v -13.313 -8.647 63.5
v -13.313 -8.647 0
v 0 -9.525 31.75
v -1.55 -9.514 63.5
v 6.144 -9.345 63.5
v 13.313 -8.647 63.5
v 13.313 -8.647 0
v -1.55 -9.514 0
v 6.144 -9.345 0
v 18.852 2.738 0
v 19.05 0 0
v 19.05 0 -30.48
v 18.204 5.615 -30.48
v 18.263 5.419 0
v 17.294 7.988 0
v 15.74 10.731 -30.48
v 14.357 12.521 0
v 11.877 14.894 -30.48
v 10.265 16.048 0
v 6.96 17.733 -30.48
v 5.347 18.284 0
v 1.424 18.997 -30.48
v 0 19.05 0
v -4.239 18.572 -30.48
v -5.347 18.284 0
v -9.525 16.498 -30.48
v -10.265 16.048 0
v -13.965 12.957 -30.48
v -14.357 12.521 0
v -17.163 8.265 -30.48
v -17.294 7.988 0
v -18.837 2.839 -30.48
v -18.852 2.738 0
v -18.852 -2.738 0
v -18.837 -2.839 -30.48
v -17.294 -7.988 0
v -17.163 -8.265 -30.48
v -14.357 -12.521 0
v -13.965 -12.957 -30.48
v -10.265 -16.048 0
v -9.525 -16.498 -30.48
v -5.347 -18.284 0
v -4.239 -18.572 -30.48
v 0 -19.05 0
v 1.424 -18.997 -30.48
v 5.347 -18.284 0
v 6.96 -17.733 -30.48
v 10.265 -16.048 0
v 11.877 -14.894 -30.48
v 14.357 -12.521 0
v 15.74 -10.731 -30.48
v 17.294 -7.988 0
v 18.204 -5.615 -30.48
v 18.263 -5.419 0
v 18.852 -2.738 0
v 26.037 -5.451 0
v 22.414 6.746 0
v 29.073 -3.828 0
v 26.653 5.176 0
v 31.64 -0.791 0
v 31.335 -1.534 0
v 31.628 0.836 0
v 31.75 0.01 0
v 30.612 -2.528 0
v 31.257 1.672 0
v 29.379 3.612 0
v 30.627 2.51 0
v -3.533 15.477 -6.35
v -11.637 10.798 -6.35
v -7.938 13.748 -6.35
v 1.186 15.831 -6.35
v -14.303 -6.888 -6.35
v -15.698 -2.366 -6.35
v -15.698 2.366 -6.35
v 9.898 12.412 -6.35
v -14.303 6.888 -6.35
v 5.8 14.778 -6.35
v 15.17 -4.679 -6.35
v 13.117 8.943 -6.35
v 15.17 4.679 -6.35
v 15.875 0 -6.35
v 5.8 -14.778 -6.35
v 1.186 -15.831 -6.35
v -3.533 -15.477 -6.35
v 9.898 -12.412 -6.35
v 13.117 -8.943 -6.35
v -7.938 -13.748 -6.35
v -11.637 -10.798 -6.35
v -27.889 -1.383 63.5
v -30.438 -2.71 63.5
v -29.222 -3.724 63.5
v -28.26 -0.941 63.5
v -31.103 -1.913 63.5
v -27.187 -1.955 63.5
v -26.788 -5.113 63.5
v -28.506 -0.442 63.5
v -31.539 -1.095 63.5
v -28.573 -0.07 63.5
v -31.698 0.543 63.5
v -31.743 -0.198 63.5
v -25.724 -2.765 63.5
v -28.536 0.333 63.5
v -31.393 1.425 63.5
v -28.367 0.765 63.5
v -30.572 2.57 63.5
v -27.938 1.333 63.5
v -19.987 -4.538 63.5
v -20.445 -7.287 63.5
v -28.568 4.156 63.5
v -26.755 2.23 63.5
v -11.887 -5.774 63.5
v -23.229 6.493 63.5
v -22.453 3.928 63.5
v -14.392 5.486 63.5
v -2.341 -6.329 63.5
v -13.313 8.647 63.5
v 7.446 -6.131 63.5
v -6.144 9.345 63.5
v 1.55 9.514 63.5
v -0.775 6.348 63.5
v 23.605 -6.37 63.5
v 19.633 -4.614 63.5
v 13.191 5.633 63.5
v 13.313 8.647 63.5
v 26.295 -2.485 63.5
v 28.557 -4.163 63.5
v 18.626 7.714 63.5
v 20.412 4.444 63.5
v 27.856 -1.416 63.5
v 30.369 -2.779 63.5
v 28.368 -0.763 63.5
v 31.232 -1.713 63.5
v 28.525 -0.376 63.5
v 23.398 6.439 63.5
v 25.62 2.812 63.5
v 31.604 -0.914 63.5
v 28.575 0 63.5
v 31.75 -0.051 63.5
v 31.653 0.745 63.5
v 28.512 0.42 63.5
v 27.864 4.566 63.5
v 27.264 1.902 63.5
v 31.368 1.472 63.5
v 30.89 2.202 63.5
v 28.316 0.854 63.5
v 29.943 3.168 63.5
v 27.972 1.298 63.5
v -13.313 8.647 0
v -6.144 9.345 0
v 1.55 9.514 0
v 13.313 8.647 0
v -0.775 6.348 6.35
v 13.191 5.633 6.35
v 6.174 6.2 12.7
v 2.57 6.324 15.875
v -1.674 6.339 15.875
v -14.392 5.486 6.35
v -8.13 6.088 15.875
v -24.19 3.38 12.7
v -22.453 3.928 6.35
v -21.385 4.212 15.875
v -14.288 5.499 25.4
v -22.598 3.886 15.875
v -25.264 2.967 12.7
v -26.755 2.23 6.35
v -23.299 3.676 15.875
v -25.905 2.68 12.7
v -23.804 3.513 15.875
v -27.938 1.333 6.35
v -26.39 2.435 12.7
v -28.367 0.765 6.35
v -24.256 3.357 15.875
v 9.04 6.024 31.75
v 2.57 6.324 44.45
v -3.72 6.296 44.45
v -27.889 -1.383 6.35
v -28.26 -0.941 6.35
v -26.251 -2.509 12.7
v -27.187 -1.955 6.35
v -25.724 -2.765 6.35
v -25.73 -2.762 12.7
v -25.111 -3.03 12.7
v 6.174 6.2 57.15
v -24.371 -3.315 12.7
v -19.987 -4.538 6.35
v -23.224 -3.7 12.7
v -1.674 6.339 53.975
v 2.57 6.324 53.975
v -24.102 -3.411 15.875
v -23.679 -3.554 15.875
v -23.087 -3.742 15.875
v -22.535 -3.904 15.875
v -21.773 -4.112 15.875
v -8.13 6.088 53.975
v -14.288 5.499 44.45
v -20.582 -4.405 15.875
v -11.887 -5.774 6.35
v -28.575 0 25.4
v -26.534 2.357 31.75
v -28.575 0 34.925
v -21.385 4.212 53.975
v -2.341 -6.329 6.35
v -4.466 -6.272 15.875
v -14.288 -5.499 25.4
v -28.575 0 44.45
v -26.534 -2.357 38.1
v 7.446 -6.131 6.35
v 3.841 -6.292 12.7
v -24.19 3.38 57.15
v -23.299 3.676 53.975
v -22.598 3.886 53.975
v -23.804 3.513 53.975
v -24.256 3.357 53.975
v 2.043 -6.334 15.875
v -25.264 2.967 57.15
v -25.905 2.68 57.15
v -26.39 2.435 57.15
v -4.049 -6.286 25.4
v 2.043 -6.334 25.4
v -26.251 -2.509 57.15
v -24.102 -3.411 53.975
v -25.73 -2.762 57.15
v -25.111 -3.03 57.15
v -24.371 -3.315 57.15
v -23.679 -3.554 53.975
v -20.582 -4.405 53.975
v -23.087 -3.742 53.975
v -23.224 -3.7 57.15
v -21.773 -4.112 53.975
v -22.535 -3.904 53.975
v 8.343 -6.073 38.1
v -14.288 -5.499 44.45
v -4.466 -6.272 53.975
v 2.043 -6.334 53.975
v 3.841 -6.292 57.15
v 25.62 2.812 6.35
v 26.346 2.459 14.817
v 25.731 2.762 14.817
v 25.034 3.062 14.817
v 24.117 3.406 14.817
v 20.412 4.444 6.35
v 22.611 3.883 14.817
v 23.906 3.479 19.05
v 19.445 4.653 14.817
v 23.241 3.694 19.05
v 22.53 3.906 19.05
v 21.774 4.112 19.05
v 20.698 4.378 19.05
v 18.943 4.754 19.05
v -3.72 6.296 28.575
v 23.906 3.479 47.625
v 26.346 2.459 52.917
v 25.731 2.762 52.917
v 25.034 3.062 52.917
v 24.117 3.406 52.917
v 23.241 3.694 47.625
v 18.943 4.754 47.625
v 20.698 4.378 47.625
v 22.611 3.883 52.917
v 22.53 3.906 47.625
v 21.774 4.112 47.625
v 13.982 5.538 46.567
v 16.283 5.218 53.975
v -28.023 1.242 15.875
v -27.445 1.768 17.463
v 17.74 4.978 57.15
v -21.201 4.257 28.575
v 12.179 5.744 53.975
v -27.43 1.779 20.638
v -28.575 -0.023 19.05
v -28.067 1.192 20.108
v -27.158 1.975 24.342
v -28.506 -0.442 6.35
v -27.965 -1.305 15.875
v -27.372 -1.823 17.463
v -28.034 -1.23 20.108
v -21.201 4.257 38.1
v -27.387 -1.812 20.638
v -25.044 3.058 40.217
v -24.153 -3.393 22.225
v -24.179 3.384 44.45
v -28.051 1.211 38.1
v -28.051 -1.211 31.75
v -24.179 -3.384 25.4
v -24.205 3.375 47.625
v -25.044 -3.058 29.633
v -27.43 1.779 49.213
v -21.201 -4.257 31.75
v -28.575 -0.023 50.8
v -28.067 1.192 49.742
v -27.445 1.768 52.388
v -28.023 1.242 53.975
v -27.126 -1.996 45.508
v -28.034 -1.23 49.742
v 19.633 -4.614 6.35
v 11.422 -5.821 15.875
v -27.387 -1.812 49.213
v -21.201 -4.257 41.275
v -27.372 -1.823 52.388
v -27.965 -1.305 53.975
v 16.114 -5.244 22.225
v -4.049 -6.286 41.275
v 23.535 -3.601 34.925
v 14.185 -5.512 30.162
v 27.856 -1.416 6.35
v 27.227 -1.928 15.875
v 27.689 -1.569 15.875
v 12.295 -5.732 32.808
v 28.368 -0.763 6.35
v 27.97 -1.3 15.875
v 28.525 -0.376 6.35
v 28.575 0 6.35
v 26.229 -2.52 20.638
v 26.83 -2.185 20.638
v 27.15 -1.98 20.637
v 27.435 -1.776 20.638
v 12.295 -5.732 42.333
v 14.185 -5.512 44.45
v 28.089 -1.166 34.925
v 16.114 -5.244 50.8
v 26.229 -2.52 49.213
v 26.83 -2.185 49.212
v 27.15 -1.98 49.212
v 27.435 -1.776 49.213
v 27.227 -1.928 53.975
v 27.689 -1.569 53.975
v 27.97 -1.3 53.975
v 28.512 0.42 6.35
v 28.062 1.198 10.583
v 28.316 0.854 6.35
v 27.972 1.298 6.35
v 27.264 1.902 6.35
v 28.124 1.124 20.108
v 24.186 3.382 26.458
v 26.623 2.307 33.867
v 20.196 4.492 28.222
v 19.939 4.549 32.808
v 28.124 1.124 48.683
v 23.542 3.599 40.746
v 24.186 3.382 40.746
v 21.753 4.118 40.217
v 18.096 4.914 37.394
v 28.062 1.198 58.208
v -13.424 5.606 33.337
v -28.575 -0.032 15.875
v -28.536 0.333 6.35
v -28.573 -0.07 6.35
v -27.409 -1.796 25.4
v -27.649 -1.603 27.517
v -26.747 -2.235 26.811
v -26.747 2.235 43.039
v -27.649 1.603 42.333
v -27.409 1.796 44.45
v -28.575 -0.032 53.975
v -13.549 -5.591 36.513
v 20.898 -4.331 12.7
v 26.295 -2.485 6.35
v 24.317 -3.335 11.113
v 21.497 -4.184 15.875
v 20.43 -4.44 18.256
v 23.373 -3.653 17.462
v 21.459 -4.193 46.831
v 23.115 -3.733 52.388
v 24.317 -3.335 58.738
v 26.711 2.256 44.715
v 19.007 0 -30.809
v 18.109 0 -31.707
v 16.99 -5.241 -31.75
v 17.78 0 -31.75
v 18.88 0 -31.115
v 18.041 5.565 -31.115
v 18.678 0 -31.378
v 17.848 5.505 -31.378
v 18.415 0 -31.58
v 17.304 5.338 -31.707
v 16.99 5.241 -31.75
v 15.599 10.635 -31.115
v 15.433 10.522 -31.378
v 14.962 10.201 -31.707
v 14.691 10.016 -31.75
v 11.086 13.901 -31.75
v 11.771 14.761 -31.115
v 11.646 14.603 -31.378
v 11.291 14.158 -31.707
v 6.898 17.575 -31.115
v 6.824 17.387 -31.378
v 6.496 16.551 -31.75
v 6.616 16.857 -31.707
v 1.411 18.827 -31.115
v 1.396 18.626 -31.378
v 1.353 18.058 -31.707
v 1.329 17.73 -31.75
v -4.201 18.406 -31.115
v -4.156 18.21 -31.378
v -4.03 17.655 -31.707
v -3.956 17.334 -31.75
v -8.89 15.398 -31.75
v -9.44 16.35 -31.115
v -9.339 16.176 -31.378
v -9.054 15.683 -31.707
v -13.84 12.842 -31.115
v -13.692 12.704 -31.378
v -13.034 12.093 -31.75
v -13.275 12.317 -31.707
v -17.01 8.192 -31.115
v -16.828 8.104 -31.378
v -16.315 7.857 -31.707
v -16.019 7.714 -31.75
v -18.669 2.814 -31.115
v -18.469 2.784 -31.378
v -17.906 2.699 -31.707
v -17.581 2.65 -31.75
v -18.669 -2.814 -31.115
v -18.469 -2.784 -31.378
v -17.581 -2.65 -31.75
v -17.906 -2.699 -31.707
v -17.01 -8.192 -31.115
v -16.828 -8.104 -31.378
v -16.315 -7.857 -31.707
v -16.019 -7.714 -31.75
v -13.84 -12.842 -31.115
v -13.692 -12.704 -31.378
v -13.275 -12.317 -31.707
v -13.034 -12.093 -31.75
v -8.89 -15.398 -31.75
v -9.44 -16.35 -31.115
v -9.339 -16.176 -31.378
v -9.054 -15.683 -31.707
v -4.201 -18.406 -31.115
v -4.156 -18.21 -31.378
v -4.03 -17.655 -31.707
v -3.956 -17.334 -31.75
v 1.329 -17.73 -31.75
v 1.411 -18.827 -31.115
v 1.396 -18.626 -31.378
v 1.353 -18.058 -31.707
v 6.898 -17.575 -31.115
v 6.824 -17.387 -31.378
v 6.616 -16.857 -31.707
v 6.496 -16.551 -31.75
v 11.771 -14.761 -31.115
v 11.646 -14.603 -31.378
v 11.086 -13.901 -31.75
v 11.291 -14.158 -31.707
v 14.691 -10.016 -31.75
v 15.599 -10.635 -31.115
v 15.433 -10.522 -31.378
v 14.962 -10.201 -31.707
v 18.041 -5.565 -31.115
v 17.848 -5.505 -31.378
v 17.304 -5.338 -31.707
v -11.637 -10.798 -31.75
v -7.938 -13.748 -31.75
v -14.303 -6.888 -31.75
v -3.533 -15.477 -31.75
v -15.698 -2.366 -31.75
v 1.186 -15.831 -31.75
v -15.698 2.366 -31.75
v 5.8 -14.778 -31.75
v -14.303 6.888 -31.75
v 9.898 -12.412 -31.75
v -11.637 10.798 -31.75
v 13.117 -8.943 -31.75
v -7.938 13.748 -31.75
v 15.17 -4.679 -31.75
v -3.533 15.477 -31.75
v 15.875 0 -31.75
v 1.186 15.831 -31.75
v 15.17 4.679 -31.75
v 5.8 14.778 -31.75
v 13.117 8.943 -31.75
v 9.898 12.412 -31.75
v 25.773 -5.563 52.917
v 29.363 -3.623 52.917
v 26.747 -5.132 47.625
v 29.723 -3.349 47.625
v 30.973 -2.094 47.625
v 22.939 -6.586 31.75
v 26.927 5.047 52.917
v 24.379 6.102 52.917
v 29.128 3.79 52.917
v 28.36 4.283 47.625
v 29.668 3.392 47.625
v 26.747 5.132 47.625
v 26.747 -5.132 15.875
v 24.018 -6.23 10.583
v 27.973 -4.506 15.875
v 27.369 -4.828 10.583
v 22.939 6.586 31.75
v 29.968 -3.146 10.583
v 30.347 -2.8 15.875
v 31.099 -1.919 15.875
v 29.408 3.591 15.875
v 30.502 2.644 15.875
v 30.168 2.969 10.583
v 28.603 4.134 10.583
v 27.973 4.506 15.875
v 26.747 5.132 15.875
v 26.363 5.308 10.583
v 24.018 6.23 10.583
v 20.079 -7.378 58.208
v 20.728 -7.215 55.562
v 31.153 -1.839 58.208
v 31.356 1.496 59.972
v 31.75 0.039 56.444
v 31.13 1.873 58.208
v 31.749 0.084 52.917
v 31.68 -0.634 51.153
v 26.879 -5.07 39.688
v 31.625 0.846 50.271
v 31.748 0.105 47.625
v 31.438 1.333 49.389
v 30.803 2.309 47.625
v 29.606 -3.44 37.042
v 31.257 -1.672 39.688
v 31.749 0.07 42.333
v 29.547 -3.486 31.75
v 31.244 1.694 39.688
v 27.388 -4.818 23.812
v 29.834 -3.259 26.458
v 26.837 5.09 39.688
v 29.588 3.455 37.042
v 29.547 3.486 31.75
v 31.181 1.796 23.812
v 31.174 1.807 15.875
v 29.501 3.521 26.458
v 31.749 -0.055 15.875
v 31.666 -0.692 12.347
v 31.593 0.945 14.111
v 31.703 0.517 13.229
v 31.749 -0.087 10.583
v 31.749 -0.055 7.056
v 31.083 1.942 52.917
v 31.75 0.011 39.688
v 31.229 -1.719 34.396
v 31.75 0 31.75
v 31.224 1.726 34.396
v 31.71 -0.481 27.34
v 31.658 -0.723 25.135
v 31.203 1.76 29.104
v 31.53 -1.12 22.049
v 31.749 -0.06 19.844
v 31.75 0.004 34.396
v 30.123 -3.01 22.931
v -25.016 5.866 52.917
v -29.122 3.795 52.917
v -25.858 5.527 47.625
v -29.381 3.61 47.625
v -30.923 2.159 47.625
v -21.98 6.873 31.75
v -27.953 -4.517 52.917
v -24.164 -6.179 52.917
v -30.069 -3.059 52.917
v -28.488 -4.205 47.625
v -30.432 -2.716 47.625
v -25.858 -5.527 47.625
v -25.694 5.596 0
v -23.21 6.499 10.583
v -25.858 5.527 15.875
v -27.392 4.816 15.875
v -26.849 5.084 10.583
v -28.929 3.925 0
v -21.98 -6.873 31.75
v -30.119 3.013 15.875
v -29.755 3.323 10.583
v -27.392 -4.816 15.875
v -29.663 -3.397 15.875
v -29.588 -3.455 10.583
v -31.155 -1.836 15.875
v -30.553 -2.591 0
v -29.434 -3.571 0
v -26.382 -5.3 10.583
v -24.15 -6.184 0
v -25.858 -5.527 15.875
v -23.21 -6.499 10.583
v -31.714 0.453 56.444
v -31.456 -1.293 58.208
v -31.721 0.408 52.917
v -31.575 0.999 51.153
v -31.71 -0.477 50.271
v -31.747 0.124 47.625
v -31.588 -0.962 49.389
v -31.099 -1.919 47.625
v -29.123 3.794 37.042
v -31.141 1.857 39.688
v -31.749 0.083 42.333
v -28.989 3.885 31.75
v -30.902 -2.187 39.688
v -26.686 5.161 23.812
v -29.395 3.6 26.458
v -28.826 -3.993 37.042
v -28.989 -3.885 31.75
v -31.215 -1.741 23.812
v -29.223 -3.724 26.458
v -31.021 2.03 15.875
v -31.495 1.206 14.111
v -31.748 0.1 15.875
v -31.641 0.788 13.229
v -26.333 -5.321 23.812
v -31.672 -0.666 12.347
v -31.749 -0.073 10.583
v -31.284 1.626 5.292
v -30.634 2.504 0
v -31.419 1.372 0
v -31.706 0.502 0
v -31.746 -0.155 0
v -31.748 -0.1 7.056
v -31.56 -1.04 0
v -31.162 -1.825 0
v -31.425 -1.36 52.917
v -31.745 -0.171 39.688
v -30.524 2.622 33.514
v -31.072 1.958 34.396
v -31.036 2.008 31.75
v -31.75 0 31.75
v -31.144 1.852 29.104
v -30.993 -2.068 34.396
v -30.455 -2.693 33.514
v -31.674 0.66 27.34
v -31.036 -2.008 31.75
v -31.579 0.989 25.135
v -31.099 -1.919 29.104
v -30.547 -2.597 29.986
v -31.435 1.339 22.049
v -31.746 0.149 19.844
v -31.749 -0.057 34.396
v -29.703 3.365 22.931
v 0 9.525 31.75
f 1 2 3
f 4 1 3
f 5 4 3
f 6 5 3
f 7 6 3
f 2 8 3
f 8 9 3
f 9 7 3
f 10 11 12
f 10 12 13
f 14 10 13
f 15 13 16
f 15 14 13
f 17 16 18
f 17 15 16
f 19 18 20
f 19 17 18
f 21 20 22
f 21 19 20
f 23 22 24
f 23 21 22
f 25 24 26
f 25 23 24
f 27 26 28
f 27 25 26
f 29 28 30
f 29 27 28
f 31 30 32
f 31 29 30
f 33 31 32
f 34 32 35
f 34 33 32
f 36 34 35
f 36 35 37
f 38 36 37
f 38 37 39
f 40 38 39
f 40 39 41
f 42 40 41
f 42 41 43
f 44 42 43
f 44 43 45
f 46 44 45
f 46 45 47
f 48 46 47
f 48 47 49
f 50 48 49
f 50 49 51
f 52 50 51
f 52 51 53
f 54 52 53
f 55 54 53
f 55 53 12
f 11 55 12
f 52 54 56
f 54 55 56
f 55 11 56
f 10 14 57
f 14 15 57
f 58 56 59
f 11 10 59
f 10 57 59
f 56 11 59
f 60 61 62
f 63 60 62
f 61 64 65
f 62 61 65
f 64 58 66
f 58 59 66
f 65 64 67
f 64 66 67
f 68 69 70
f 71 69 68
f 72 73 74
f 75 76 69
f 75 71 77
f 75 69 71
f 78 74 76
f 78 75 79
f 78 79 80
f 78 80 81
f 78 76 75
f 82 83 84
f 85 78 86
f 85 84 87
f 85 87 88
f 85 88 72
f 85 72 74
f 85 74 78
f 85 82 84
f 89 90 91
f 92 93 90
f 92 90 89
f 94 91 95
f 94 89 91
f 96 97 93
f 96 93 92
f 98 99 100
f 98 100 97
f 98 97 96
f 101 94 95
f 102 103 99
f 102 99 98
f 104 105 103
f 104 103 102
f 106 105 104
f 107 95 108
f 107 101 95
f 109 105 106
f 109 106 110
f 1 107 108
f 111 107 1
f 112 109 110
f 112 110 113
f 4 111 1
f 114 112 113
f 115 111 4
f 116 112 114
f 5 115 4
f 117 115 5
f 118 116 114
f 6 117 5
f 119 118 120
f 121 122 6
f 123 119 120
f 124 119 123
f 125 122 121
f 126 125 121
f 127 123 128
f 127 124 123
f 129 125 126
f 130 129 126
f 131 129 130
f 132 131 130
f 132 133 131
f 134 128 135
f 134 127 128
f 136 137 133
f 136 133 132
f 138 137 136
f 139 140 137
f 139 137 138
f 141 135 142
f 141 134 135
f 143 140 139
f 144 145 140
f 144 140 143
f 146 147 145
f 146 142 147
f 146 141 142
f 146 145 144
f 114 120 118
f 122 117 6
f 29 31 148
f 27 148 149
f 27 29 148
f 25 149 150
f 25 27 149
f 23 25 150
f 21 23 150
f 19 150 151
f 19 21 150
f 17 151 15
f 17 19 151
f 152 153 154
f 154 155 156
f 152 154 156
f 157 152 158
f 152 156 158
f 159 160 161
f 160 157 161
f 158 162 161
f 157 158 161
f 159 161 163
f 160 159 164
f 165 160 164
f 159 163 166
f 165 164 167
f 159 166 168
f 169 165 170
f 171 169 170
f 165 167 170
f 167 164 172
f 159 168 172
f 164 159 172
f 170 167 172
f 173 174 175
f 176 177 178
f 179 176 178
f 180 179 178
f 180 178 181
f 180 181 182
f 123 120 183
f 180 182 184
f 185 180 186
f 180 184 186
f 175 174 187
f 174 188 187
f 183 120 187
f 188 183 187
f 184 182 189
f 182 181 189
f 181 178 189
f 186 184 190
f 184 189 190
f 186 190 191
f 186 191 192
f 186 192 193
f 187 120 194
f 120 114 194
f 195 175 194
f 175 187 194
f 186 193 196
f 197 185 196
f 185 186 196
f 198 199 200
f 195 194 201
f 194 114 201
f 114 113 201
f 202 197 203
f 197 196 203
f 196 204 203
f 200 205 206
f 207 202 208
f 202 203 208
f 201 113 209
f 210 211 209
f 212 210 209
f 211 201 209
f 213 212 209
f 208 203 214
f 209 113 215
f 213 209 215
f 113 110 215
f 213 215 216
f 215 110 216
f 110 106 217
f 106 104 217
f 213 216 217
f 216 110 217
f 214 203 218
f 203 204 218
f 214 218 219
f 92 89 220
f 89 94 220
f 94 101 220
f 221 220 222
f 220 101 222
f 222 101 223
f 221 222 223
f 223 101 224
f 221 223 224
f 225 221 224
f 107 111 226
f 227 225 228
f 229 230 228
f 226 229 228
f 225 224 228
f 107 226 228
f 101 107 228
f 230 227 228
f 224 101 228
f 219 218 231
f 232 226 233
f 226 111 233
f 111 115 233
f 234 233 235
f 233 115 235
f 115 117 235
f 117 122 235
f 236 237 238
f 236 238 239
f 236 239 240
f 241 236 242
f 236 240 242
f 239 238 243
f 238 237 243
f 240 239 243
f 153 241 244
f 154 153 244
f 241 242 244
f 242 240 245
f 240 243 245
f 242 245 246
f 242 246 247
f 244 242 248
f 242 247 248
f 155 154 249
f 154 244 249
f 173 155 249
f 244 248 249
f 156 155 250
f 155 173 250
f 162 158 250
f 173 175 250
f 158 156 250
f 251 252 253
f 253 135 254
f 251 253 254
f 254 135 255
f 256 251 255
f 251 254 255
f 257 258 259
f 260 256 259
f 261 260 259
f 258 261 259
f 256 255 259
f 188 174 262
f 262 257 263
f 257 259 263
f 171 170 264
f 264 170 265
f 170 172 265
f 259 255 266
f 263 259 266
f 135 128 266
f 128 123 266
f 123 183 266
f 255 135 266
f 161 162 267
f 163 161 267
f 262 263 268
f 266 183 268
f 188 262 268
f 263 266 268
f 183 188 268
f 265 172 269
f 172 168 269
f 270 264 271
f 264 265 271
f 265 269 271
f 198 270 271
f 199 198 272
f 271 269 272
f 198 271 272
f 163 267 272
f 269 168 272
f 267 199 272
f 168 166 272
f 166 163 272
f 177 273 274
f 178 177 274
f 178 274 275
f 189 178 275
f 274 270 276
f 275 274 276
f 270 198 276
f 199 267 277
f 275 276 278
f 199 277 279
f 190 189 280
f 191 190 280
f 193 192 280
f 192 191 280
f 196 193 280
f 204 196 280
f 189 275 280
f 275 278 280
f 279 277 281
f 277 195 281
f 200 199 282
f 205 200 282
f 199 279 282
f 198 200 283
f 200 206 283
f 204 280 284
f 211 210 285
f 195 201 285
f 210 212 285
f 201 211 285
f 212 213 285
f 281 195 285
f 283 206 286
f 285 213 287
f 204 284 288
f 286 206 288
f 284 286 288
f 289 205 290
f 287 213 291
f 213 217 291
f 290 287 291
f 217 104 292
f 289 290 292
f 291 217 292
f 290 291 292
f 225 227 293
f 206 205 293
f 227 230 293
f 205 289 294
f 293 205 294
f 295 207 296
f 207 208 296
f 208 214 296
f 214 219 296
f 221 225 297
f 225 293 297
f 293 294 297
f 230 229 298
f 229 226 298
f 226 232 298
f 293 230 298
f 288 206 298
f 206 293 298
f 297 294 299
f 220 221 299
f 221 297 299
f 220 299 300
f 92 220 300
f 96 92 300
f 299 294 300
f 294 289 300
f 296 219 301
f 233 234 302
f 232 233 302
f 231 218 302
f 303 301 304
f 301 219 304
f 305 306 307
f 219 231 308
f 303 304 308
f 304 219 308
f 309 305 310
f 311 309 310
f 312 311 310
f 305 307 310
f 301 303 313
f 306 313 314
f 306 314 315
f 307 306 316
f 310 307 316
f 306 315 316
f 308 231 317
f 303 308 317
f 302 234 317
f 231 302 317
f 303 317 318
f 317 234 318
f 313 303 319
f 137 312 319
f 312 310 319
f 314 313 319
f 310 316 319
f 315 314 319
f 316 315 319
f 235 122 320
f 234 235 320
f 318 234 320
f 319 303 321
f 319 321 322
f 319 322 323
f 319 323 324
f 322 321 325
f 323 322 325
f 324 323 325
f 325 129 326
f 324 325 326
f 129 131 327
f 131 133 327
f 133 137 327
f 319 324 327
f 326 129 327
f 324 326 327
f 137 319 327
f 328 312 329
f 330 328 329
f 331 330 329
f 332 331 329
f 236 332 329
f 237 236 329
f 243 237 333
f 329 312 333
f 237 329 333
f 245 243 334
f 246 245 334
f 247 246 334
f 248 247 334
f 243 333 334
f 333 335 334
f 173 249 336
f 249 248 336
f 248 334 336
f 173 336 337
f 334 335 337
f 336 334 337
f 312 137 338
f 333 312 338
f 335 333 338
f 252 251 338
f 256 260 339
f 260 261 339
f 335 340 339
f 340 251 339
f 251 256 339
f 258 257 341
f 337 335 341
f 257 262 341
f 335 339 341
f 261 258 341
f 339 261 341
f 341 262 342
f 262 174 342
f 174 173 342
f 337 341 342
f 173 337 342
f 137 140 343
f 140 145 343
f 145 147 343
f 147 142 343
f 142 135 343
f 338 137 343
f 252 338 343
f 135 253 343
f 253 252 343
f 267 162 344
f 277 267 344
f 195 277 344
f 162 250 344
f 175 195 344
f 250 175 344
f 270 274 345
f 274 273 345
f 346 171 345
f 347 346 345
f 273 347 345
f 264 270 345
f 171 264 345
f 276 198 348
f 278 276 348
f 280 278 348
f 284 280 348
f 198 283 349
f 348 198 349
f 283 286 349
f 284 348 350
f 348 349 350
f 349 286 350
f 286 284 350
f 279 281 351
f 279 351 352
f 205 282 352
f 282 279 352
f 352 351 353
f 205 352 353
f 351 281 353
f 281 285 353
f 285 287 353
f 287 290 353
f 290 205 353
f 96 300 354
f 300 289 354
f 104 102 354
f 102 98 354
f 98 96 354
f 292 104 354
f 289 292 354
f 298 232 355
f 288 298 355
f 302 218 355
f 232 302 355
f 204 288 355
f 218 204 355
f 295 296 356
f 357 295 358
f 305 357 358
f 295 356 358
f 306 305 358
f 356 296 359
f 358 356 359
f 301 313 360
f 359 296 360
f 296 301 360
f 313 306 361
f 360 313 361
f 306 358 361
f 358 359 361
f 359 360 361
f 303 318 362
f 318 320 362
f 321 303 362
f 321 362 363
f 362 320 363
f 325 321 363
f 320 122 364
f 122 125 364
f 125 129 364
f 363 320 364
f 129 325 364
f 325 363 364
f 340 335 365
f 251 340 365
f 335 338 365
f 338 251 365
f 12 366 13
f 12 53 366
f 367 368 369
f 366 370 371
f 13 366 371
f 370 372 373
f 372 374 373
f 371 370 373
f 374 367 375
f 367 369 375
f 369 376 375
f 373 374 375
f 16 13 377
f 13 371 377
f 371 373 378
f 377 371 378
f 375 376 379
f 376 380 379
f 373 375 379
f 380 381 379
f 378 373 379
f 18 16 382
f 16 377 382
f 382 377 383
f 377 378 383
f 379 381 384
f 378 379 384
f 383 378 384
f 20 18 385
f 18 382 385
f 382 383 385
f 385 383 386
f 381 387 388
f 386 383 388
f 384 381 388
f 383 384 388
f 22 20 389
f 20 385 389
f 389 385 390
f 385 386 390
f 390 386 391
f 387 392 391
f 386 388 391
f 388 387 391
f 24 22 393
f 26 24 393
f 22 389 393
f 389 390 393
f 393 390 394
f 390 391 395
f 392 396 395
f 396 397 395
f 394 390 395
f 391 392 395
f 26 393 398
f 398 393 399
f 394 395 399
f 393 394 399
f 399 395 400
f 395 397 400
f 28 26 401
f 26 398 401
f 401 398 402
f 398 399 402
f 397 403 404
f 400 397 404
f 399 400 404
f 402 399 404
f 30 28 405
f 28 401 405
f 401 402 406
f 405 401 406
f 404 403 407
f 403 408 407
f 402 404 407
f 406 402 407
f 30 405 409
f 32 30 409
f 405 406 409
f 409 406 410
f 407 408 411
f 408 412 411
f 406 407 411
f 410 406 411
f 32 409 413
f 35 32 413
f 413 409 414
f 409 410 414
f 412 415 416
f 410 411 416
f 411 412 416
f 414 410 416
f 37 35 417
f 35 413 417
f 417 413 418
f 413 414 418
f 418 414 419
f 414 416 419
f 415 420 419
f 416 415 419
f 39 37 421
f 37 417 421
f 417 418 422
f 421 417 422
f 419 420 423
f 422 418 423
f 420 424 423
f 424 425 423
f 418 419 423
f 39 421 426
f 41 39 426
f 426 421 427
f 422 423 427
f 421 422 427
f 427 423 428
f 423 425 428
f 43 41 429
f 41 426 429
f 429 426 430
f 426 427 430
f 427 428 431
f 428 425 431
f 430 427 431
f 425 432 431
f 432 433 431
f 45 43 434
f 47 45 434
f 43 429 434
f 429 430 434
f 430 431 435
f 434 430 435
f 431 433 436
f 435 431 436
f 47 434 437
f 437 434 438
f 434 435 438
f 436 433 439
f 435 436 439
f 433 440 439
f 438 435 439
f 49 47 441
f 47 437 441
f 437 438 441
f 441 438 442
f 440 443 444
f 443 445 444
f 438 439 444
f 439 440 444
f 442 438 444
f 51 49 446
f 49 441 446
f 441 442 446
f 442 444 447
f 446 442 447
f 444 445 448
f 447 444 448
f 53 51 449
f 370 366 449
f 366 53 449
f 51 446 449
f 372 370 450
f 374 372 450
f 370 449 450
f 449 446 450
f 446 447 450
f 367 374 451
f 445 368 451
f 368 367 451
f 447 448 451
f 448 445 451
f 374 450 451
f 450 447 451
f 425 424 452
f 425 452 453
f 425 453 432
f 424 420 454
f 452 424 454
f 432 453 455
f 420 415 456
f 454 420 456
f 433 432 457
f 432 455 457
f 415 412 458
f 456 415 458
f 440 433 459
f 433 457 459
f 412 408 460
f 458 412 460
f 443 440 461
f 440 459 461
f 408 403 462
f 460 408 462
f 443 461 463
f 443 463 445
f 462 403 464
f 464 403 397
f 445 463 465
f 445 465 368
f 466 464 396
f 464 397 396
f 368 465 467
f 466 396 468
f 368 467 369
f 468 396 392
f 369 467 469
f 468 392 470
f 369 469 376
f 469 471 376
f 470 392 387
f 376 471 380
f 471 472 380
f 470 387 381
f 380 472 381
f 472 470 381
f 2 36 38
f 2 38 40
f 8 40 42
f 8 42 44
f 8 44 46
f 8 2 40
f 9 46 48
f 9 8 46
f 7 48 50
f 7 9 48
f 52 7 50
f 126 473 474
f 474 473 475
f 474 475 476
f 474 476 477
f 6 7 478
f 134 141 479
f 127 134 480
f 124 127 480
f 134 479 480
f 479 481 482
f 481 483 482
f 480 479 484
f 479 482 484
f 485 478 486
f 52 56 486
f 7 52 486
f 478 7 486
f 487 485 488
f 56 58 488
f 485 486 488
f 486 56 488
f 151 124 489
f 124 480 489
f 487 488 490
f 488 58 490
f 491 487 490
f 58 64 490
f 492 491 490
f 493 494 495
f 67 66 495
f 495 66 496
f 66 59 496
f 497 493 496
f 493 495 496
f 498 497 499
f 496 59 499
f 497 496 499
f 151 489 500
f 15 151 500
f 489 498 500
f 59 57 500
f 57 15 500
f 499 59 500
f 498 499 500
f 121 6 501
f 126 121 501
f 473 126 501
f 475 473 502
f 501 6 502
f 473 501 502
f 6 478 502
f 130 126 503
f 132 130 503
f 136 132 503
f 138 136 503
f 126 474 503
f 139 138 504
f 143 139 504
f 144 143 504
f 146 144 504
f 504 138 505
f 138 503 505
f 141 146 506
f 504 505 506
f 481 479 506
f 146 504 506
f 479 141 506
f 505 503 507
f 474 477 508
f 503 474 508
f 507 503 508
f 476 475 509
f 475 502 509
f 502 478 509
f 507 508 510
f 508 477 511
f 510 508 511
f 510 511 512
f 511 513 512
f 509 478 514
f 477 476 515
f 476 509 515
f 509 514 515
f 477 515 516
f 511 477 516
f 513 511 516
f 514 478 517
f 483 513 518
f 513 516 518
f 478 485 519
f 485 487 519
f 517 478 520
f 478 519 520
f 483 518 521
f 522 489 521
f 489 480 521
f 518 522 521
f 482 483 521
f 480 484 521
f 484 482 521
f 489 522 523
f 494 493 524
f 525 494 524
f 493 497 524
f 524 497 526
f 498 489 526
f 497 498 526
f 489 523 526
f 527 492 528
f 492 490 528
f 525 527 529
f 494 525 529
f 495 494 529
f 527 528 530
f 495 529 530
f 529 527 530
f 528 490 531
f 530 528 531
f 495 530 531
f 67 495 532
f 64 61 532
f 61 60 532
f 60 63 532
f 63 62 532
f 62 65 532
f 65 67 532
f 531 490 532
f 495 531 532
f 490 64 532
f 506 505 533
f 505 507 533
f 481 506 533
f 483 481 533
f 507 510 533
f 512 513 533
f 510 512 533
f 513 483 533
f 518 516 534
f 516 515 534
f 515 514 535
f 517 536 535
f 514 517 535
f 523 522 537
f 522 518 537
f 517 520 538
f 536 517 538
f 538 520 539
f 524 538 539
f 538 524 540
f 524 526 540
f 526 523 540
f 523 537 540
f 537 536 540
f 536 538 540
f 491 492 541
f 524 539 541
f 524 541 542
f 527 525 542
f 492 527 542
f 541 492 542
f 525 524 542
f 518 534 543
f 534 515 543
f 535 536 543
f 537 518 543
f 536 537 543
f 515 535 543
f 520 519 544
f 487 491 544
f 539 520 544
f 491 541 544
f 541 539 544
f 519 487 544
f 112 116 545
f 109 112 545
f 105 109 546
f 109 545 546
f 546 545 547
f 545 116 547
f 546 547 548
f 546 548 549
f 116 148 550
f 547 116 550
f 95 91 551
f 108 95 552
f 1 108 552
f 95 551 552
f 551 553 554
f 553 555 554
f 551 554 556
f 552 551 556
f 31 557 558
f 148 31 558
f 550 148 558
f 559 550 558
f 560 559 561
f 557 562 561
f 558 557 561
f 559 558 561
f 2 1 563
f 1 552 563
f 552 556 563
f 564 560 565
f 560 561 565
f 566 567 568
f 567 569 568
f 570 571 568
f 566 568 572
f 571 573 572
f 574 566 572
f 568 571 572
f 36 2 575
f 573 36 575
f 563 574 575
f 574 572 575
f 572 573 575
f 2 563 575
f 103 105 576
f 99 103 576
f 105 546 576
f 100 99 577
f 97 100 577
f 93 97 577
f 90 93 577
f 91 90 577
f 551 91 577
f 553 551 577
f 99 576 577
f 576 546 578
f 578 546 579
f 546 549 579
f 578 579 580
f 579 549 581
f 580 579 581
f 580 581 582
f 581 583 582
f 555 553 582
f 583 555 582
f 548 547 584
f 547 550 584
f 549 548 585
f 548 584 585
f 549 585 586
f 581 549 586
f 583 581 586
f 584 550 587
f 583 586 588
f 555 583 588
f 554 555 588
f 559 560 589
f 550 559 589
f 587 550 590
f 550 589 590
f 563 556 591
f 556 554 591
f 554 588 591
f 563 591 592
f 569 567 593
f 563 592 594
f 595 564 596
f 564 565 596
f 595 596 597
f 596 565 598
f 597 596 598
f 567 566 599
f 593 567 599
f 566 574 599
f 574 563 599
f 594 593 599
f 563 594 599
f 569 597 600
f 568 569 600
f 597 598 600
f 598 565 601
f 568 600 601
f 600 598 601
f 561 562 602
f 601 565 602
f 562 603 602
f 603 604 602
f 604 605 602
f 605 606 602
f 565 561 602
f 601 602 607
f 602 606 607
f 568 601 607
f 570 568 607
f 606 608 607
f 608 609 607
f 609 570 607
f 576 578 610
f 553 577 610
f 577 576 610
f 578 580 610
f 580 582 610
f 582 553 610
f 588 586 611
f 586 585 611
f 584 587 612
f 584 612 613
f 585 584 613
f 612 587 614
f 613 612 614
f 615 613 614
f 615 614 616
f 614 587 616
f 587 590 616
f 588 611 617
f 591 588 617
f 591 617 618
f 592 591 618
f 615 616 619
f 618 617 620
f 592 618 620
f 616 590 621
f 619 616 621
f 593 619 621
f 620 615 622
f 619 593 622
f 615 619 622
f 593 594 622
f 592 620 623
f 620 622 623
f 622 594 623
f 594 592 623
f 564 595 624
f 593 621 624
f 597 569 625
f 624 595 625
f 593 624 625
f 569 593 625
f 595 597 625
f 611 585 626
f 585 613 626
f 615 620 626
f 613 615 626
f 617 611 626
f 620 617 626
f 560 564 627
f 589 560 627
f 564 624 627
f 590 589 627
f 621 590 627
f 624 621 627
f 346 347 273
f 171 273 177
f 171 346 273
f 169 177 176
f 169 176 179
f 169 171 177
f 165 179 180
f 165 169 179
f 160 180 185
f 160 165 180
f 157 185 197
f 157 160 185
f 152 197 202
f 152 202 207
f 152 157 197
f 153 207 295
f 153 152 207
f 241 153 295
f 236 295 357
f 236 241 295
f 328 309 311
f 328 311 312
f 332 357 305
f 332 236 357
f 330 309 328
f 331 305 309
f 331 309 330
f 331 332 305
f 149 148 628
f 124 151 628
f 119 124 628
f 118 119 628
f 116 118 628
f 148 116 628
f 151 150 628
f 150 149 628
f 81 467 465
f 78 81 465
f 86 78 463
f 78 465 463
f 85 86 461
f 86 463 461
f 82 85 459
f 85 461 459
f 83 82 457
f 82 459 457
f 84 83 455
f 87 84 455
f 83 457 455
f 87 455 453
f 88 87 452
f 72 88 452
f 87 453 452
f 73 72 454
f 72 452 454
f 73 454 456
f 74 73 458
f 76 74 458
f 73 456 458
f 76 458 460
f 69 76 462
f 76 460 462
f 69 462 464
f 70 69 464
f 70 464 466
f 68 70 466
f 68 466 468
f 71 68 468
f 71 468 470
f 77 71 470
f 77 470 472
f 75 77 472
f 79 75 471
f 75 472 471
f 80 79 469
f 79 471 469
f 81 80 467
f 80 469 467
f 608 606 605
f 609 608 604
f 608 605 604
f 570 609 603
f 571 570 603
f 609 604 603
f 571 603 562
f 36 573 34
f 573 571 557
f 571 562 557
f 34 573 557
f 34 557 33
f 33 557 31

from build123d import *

# Parameters (mm, degrees)
F1_DEPTH = 63.5
F2_R     = 19.05
F3_DEPTH = 31.75
F4_R     = 15.875
F5_DEPTH = 25.4
F8_DEPTH = 57.15
F9_R     = 1.27


with BuildPart() as f1:
    # F0 (on Top) → F1 (new body)
    with BuildSketch(Plane.XY):
        with BuildLine():
            add(Edge.make_bspline(
                [(13.3132174264, -8.647188373), (31.75, -6.0925128414), (31.75, 0)],
                knots=[5.1450784578, 5.1450784578, 5.1450784578, 6.2831853072, 6.2831853072, 6.2831853072], degree=2, weights=[1, 0.8424114003, 1]))
            add(Edge.make_bspline(
                [(31.75, 0), (31.75, 6.0925128414), (13.3132174264, 8.647188373)],
                knots=[0, 0, 0, 1.1381068494, 1.1381068494, 1.1381068494], degree=2, weights=[1, 0.8424114003, 1]))
            ThreePointArc((13.3132174264, 8.647188373), (15.2210865519, 4.5093402154), (15.875, 0))
            ThreePointArc((15.875, 0), (15.2210865519, -4.5093402154), (13.3132174264, -8.647188373))
        make_face()
        with BuildLine():
            ThreePointArc((15.875, 0), (15.2210865519, 4.5093402154), (13.3132174264, 8.647188373))
            add(Edge.make_bspline(
                [(13.3132174264, 8.647188373), (0, 10.4919218926), (-13.3132174264, 8.647188373)],
                knots=[1.1381068494, 1.1381068494, 1.1381068494, 2.0034858042, 2.0034858042, 2.0034858042], degree=2, weights=[1, 0.907841299, 1]))
            ThreePointArc((-13.3132174264, 8.647188373), (-15.875, 0), (-13.3132174264, -8.647188373))
            add(Edge.make_bspline(
                [(-13.3132174264, -8.647188373), (0, -10.4919218926), (13.3132174264, -8.647188373)],
                knots=[4.2796995029, 4.2796995029, 4.2796995029, 5.1450784578, 5.1450784578, 5.1450784578], degree=2, weights=[1, 0.907841299, 1]))
            ThreePointArc((13.3132174264, -8.647188373), (15.2210865519, -4.5093402154), (15.875, 0))
        make_face()
        with BuildLine():
            ThreePointArc((-13.3132174264, -8.647188373), (-15.875, 0), (-13.3132174264, 8.647188373))
            add(Edge.make_bspline(
                [(-13.3132174264, 8.647188373), (-75.7189241125, 0), (-13.3132174264, -8.647188373)],
                knots=[2.0034858042, 2.0034858042, 2.0034858042, 4.2796995029, 4.2796995029, 4.2796995029], degree=2, weights=[1, 0.4193139347, 1]))
        make_face()
    extrude(amount=F1_DEPTH)

    # F2 (on Top) → F3 (join)
    with BuildSketch(Plane.XY):
        Circle(F2_R)
    extrude(amount=-F3_DEPTH)

    # F4 (on face) → F5 (cut)
    with BuildSketch(Plane(origin=(0, 0, -31.75), x_dir=(1, 0, 0), z_dir=(0, 0, -1))):
        Circle(F4_R)
    extrude(amount=-F5_DEPTH, mode=Mode.SUBTRACT)

    # F7 (on face) → F8 (cut)
    with BuildSketch(Plane.XY.offset(63.5)):
        with BuildLine():
            add(Edge.make_bspline(
                [(28.575, 0), (28.575, 10.9985226281), (-14.2875, 5.499261314), (-57.15, 0), (-14.2875, -5.499261314), (28.575, -10.9985226281), (28.575, 0)],
                knots=[0, 0, 0, 2.0943951024, 2.0943951024, 4.1887902048, 4.1887902048, 6.2831853072, 6.2831853072, 6.2831853072], degree=2, weights=[1, 0.5, 1, 0.5, 1, 0.5, 1]))
        make_face()
    extrude(amount=-F8_DEPTH, mode=Mode.SUBTRACT)

    # F9
    f9_edges = [f1.edges().sort_by_distance(p)[0] for p in [
        (-19.05, 0, -31.75),
    ]]
    fillet(f9_edges, radius=F9_R)


solid = f1.part
